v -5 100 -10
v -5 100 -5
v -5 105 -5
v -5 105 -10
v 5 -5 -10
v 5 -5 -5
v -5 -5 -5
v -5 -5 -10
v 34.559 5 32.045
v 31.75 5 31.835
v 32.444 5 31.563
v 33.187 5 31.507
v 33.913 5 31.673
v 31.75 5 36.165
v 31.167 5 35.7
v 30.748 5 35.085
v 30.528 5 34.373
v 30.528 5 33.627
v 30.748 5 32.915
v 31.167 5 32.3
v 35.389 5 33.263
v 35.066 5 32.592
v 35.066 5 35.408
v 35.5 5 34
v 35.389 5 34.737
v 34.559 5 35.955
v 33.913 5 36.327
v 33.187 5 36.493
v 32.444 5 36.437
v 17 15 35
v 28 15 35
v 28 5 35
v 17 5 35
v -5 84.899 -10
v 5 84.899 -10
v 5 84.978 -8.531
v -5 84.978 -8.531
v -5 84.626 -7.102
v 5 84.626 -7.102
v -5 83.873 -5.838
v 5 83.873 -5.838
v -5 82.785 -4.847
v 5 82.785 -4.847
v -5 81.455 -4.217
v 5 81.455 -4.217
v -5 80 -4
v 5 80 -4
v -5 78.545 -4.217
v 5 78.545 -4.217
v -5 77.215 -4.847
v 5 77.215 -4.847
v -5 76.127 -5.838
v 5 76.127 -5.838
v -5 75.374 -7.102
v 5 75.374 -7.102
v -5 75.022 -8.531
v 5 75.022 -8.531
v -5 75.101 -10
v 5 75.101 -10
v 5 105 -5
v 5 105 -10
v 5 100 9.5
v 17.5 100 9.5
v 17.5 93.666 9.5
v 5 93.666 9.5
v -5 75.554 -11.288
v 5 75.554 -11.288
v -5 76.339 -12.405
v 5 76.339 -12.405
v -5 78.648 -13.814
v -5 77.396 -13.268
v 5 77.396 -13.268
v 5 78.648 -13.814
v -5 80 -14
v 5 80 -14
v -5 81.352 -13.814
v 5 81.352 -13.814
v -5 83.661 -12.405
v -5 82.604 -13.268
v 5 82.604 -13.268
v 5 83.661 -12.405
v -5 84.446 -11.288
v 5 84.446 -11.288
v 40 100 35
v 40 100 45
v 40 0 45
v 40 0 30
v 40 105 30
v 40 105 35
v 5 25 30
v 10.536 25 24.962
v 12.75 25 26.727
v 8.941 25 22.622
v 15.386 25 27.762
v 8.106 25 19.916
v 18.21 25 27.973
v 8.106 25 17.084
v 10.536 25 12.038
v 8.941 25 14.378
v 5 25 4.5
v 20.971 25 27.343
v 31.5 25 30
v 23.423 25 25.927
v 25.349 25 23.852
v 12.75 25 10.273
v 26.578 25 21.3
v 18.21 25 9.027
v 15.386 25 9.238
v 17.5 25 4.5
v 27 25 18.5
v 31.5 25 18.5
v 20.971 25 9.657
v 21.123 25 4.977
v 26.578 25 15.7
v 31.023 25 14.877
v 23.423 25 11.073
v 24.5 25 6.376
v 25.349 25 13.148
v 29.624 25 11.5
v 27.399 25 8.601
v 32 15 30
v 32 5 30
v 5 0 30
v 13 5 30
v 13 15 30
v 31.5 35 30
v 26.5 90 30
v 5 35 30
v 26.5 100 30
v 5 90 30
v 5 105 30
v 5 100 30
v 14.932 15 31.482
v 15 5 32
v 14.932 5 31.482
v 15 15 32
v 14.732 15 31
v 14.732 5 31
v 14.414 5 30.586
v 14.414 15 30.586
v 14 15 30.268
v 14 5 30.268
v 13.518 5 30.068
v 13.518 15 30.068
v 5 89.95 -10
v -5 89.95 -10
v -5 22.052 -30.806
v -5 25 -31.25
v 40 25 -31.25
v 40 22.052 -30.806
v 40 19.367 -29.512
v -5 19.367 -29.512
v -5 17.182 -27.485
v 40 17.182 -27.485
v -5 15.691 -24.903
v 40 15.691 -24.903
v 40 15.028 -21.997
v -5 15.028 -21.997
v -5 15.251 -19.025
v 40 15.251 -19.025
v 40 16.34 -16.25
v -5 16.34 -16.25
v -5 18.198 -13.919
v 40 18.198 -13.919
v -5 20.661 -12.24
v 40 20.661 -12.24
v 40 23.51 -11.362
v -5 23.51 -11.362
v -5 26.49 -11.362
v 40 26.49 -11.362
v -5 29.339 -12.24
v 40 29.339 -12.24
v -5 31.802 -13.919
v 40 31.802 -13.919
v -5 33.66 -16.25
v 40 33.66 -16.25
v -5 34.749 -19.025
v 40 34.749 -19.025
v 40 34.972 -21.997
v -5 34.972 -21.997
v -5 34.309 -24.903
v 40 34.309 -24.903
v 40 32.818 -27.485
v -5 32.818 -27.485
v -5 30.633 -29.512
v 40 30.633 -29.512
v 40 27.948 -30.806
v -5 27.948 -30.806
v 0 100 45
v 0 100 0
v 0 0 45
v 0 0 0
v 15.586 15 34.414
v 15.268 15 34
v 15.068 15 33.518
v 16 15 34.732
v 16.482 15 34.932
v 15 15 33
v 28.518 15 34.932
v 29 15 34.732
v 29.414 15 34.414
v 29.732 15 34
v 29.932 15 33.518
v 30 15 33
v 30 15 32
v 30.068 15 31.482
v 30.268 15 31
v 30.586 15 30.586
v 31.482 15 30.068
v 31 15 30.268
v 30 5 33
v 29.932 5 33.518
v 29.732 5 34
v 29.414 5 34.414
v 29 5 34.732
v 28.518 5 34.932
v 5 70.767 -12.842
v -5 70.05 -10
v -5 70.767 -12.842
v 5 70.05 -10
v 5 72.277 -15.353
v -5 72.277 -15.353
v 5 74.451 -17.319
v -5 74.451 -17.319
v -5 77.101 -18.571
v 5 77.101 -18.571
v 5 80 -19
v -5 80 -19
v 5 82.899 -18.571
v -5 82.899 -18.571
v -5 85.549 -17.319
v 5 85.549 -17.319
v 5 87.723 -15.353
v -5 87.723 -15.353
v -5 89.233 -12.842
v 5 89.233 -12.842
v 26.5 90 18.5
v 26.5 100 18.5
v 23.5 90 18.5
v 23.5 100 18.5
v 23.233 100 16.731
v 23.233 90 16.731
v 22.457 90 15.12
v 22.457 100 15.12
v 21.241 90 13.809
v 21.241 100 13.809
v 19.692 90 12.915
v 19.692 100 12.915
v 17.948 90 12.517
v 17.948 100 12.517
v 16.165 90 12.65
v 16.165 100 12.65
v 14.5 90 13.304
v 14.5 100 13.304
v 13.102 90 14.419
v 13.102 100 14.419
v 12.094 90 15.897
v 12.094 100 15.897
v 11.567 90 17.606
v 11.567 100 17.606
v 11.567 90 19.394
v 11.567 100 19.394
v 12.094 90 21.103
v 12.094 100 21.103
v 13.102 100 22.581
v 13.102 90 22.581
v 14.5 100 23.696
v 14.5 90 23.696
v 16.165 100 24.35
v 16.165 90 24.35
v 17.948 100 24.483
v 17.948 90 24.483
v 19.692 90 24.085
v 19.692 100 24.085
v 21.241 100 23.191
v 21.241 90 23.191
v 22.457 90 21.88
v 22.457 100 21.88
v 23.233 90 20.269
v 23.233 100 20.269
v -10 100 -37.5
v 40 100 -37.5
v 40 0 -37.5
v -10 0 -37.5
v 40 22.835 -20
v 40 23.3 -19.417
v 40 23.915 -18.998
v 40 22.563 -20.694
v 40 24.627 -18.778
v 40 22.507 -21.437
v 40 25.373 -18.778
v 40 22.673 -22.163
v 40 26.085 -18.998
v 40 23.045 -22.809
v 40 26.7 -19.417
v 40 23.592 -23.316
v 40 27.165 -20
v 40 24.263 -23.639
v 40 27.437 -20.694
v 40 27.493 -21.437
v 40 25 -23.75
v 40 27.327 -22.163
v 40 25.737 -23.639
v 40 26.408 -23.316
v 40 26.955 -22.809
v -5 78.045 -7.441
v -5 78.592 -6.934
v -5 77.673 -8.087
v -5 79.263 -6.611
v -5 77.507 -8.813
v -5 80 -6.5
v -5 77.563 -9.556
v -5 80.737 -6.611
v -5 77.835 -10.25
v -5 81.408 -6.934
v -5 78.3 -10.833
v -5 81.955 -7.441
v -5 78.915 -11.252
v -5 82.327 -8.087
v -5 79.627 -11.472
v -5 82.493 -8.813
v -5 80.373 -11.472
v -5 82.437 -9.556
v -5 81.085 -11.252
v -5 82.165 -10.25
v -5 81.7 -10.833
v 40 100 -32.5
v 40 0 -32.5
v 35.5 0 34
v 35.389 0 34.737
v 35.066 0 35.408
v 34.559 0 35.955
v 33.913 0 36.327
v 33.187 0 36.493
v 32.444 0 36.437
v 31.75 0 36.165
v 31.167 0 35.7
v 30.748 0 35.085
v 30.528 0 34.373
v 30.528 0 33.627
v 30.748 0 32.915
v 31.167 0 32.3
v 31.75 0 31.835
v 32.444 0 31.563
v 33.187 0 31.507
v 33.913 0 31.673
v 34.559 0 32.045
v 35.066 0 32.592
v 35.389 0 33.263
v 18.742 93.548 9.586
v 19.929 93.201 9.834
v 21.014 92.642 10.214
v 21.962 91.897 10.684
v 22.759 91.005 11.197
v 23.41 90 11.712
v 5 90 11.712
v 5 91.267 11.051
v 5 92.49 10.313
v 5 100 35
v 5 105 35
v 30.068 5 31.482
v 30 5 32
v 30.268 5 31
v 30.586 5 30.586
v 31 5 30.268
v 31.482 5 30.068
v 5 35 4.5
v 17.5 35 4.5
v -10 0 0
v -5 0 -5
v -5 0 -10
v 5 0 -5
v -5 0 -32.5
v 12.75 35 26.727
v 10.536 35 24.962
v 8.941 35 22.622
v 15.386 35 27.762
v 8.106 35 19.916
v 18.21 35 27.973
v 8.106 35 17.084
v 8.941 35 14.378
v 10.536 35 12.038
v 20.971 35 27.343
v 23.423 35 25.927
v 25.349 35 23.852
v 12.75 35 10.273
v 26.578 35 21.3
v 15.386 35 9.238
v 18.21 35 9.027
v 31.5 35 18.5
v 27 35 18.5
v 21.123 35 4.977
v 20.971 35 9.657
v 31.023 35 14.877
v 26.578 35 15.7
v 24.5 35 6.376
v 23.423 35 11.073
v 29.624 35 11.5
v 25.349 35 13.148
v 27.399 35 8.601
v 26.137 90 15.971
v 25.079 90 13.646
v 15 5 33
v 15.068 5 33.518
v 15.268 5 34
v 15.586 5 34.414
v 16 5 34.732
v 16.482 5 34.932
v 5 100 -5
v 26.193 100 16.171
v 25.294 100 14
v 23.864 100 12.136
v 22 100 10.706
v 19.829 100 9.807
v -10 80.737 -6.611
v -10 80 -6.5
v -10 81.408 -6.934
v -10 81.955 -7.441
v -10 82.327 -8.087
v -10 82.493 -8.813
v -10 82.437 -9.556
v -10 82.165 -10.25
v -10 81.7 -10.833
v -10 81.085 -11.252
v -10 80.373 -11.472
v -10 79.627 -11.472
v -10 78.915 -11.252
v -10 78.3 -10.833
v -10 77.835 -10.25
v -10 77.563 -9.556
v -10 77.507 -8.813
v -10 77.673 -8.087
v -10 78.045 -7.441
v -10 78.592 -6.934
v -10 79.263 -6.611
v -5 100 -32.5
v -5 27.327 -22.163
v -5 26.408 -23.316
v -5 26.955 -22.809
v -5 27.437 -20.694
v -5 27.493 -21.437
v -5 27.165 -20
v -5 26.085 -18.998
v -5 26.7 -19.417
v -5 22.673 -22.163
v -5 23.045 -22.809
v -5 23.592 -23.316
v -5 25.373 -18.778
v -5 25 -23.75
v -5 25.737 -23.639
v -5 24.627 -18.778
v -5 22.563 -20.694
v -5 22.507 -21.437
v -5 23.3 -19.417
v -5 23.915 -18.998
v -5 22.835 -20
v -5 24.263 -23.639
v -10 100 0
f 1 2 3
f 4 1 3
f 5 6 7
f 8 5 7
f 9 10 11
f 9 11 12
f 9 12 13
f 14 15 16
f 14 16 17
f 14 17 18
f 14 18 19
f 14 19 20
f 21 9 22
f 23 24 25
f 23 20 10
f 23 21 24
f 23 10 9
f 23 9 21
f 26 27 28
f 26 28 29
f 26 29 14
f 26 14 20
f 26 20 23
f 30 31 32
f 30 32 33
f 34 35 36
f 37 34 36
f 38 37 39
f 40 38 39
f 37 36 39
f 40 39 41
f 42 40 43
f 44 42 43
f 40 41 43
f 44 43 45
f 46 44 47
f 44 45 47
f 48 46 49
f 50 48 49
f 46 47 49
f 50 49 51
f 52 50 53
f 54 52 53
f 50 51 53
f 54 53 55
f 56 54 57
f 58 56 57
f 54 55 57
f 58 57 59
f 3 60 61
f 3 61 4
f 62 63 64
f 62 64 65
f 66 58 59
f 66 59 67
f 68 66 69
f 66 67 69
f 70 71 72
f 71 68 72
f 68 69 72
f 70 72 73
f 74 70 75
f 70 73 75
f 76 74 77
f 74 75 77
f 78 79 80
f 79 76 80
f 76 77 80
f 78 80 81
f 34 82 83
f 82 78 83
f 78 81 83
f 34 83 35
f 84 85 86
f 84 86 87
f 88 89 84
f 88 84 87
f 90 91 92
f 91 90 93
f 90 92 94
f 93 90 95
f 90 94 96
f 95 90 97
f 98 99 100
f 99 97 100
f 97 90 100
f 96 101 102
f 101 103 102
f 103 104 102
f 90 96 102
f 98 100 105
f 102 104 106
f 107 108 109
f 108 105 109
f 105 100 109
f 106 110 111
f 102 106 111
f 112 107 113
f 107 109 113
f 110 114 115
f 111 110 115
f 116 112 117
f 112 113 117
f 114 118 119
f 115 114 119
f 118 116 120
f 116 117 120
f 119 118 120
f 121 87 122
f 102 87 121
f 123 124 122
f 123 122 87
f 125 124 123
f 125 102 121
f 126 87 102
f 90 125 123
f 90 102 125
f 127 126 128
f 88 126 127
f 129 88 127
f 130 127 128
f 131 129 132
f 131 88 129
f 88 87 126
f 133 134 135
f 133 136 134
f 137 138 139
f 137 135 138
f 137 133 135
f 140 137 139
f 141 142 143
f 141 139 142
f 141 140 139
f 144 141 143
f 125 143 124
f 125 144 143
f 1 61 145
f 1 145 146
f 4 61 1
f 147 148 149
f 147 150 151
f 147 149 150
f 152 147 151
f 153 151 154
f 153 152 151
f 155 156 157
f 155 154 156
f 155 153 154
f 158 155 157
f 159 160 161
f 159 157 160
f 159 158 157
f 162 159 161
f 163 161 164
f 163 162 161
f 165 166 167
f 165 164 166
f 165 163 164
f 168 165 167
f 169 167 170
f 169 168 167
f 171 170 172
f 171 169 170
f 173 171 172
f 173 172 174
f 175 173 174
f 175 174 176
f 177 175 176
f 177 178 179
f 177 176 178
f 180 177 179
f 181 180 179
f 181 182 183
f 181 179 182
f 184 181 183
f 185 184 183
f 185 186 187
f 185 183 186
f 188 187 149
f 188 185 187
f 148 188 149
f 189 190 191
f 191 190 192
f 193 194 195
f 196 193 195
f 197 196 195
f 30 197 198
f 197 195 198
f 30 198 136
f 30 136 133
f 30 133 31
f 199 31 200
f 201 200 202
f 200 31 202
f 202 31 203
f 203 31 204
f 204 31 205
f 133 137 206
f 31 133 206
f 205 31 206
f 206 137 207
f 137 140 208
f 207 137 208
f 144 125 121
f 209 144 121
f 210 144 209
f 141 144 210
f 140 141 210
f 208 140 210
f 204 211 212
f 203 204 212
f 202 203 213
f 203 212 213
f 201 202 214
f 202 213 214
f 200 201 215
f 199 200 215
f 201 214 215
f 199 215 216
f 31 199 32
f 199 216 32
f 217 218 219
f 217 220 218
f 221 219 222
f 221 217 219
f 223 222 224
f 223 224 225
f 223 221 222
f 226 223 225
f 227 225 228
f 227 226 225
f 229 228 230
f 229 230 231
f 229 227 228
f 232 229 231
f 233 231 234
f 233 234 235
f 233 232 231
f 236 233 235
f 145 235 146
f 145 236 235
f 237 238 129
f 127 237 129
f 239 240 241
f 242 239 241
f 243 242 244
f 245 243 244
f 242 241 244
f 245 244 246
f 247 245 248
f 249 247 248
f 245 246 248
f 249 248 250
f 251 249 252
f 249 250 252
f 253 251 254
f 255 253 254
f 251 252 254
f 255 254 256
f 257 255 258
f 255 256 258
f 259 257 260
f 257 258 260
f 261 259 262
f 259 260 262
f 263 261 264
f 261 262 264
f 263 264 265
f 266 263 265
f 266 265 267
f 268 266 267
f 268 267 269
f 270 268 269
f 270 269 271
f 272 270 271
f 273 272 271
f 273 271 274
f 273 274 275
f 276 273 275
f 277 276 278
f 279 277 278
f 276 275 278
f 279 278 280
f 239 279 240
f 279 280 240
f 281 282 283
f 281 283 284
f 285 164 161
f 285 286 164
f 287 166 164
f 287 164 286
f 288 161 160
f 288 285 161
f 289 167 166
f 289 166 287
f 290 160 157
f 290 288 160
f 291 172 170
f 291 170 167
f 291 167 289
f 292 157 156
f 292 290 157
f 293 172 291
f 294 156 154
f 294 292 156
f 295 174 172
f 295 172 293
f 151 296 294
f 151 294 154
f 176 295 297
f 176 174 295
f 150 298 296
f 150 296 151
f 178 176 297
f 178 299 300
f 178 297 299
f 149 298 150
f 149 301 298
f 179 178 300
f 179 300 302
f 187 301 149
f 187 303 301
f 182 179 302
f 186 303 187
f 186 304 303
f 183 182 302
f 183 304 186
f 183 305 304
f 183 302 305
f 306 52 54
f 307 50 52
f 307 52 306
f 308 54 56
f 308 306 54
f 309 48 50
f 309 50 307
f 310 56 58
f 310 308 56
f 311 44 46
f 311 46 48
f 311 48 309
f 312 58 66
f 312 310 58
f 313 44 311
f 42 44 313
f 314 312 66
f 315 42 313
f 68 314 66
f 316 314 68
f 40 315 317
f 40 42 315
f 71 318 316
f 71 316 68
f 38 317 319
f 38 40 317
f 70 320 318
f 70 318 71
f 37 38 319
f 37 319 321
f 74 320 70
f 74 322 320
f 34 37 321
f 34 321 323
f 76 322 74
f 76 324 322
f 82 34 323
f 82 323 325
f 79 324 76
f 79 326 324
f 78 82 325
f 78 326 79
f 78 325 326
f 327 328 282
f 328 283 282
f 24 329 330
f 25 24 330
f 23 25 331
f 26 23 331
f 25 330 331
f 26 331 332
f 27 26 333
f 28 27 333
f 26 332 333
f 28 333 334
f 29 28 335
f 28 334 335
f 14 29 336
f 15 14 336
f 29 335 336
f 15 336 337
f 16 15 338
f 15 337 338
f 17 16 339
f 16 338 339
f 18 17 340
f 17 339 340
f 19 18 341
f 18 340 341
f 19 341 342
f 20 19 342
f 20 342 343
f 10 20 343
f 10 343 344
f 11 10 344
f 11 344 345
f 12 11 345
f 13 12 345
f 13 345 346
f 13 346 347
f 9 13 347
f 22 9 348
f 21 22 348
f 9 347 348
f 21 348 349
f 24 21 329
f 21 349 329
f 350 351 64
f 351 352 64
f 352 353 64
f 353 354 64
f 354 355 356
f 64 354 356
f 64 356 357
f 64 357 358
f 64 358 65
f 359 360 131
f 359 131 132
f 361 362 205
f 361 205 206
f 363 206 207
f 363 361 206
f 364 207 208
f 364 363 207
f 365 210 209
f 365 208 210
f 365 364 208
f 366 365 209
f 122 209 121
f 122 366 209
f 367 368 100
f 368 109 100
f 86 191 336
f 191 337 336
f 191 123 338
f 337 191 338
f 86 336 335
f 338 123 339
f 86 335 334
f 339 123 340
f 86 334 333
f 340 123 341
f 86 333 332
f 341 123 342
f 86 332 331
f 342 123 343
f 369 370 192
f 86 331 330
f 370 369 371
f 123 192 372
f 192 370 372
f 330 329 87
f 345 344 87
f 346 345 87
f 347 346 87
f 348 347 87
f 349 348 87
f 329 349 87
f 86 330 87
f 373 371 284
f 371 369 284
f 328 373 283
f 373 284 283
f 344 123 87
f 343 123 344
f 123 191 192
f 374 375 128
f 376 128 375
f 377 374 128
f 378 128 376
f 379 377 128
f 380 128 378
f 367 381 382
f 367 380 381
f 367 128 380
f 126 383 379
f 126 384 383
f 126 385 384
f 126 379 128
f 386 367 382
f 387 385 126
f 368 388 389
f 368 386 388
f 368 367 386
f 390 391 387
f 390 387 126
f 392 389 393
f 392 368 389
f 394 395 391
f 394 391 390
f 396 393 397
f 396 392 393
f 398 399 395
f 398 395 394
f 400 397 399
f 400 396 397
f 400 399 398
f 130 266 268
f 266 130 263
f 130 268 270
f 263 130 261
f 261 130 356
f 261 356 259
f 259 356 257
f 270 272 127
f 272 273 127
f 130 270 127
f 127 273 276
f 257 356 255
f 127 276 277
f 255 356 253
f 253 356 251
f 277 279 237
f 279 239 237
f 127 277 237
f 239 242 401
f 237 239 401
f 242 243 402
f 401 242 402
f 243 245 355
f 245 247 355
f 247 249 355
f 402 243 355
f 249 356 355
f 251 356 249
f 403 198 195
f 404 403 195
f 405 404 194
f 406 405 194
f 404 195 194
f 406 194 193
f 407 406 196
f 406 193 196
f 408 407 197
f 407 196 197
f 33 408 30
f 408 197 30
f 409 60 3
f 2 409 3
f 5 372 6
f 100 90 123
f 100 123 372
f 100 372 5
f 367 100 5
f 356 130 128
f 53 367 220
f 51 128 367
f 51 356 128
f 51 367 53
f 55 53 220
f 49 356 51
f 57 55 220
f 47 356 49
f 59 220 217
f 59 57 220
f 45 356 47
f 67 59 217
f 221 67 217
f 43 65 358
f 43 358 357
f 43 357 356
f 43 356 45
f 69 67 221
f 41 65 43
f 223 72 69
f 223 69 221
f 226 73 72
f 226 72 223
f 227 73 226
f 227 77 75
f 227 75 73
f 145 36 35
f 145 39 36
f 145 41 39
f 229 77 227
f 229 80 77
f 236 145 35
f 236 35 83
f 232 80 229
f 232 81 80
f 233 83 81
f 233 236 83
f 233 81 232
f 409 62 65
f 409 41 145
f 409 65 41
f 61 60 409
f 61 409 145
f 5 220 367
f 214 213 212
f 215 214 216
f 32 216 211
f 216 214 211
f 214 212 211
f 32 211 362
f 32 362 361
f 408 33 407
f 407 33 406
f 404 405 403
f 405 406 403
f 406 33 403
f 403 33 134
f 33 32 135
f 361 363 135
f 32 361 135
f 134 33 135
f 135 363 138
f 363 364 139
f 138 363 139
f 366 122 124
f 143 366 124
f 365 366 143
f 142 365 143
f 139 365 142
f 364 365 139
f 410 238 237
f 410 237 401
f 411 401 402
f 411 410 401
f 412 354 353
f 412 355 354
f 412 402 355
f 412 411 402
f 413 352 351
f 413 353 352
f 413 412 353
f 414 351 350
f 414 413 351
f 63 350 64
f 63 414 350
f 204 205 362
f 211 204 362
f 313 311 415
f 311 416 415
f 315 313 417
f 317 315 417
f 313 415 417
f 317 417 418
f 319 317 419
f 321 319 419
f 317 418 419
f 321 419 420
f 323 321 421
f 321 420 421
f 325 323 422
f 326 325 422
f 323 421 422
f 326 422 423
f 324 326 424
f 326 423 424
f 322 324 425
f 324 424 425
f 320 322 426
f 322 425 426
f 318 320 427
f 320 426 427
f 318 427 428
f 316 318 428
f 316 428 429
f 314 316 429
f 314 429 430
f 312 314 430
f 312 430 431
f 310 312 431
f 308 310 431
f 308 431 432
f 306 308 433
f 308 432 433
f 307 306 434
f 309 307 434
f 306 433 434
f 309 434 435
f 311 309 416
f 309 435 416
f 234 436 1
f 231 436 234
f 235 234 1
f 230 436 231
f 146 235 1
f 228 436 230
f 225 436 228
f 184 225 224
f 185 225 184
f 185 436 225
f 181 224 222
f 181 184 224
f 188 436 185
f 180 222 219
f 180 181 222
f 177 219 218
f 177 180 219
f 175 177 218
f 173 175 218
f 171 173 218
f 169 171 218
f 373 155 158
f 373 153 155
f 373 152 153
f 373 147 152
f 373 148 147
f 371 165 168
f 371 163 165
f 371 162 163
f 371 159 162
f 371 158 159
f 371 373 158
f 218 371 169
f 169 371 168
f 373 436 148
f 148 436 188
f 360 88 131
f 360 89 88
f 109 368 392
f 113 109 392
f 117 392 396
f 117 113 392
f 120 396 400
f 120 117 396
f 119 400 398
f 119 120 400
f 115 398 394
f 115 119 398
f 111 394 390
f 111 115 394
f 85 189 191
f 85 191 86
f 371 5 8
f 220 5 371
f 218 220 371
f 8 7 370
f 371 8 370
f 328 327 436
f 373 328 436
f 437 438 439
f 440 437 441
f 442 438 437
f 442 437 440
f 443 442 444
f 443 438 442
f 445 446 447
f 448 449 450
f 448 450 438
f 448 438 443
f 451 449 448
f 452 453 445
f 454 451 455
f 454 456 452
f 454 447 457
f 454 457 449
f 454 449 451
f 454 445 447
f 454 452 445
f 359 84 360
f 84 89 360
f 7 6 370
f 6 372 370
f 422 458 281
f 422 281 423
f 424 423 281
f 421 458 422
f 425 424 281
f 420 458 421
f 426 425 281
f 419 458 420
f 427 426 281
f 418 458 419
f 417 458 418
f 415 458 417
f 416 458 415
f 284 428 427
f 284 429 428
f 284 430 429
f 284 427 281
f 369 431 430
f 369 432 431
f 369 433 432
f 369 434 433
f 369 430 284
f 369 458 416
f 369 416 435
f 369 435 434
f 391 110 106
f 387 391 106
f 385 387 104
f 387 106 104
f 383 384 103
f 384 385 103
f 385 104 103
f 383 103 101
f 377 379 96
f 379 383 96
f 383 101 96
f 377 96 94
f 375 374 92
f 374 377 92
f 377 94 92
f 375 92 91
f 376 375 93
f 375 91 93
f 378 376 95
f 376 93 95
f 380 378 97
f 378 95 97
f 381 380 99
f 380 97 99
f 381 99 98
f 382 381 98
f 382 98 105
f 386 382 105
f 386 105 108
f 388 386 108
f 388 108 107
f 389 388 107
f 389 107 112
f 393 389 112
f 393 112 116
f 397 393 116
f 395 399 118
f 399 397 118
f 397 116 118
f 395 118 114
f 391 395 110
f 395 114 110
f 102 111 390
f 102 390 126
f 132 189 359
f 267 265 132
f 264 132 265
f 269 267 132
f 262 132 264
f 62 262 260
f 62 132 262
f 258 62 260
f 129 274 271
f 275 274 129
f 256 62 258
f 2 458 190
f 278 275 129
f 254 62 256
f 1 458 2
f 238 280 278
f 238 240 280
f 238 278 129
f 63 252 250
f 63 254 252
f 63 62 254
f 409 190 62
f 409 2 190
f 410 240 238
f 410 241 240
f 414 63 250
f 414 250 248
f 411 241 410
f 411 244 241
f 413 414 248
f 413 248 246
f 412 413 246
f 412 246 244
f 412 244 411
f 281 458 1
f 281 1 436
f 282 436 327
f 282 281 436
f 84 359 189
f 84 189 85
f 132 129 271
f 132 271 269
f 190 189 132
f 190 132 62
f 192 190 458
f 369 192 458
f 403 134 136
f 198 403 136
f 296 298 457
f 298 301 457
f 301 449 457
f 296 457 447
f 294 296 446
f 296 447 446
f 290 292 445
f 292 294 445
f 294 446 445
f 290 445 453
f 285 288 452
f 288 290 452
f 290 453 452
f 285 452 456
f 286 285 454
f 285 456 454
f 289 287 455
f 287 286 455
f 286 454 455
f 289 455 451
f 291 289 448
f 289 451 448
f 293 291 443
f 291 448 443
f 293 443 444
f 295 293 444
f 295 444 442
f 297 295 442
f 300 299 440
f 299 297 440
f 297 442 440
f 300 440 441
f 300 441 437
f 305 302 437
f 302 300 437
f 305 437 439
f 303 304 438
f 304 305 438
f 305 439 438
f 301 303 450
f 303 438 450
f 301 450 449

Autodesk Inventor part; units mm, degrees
ref_plane "YZ Plane" through (0, 0, 0) normal (1, 0, 0) x (0, 1, 0)
ref_plane "XZ Plane" through (0, 0, 0) normal (0, 1, 0) x (-1, 0, 0)
sketch "Sketch1" plane through (0, 0, 0) normal (0, 0, 1) x (1, 0, 0)
  line L0 (0, 0) -> (40, 0)
  line L1 (40, 0) -> (40, 100)
  line L2 (40, 100) -> (0, 100)
  line L3 (0, 100) -> (0, 0)
  dimension "d0" = 40
  dimension "d1" = 100
extrude "Extrusion1" add sketch "Sketch1" along normal blind 45
sketch "Sketch2" plane through (0, 0, 0) normal (0, 0, -1) x (-1, 0, 0)
  line L0 (-40, 0) -> (-40, 100) projected
  line L1 (-40, 100) -> (10, 100)
  line L2 (10, 100) -> (10, 0)
  line L3 (10, 0) -> (-40, 0)
  line L4 (-40, 0) -> (-40, 100)
  point P0 (0, 0)
  dimension "d4" = 10
extrude "Extrusion2" add sketch "Sketch2" along normal blind 37.5
sketch "Sketch3" plane through (40, 0, 45) normal (1, 0, 0) x (0, 0, -1)
  line L0 (82.5, 100) -> (0, 100) projected
  line L1 (0, 0) -> (0, 100) projected
  line L2 (82.5, 0) -> (0, 0) projected
  line L3 (82.5, 100) -> (82.5, 0) projected
  line L4 (5, 5) -> (5, 95)
  line L5 (5, 95) -> (77.5, 95)
  line L6 (77.5, 95) -> (77.5, 5)
  line L7 (77.5, 5) -> (5, 5)
  point P0 (45, 0)
  dimension "d7" = 5
extrude "Extrusion3" cut sketch "Sketch3" against normal blind 35 contours L4 L5 L6 L7
sketch "Sketch4" plane through (5, 0, 45) normal (1, 0, 0) x (0, 0, -1)
  line L0 (45, 100) -> (45, 0) projected
  line L1 (45, 100) -> (82.5, 100) projected
  line L2 (82.5, 0) -> (82.5, 100) projected
  line L3 (45, 0) -> (82.5, 0) projected
  line L4 (50, 5) -> (50, 95)
  line L5 (50, 95) -> (77.5, 95)
  line L6 (77.5, 95) -> (77.5, 5)
  line L7 (77.5, 5) -> (50, 5)
  point P0 (45, 0)
  dimension "d10" = 5
extrude "Extrusion4" cut sketch "Sketch4" against normal blind 10 contours L4 L5 L6 L7
sketch "Sketch5" plane through (0, 0, 45) normal (0, -1, 0) x (1, 0, 0)
  line L0 (0, 0) -> (40, 0) projected
  line L1 (0, -45) -> (0, 0) projected
  line L2 (-10, -45) -> (0, -45) projected
  line L3 (-10, -45) -> (-10, -82.5) projected
  line L4 (40, -82.5) -> (-10, -82.5) projected
  line L5 (40, -77.5) -> (-5, -77.5)
  line L6 (-5, -77.5) -> (-5, -50)
  line L7 (-5, -50) -> (5, -50)
  line L8 (5, -50) -> (5, -5)
  line L9 (5, -5) -> (40, -5)
  line L10 (40, -77.5) -> (40, -5)
  line L11 (40, -82.5) -> (40, 0) projected
  dimension "d13" = 5
extrude "Extrusion5" cut sketch "Sketch5" against normal through all contours L10 L5 L6 L7 L8 L9
sketch "Sketch6" plane through (0, 100, 45) normal (0, 1, 0) x (1, 0, 0)
  line L0 (0, 45) -> (0, 0) projected
  line L1 (0, 0) -> (40, 0)
  line L2 (40, 0) -> (40, 10)
  line L3 (40, 10) -> (0, 10)
  line L4 (0, 10) -> (0, 0)
  dimension "d16" = 40
  dimension "d17" = 10
extrude "Extrusion6" add sketch "Sketch6" against normal blind 100
sketch "Sketch8" plane through (40, 100, 35) normal (0, 0, -1) x (-1, 0, 0)
  line L0 (35, 0) -> (35, -100) projected
  line L1 (0, 0) -> (35, 0) projected
  line L2 (0, 0) -> (0, -100) projected
  line L3 (35, -100) -> (0, -100) projected
  line L4 (35, -105) -> (0, -105)
  line L5 (0, -105) -> (0, 5)
  line L6 (0, 5) -> (35, 5)
  line L7 (35, 5) -> (35, -105)
  point P0 (40, -100)
  dimension "d20" = 5
  dimension "d21" = 5
extrude "Extrusion7" add sketch "Sketch8" along normal blind 5
sketch "Sketch10" plane through (5, 0, -5) normal (0, 0, -1) x (-1, 0, 0)
  line L0 (0, 0) -> (0, 100) projected
  line L1 (10, 0) -> (0, 0) projected
  line L2 (10, 0) -> (10, 100) projected
  line L3 (0, 100) -> (10, 100) projected
  line L4 (-35, -5) -> (0, -5) projected
  line L5 (10, 0) -> (0, 0)
  line L6 (0, 0) -> (0, -5)
  line L7 (0, -5) -> (10, -5)
  line L8 (10, -5) -> (10, 0)
  line L9 (0, 105) -> (0, 100) projected
  line L10 (10, 100) -> (0, 100)
  line L11 (0, 100) -> (0, 105)
  line L12 (0, 105) -> (10, 105)
  line L13 (10, 105) -> (10, 100)
  point P0 (5, 0)
extrude "Extrusion8" add sketch "Sketch10" along normal blind 5
sketch "Sketch25" plane through (5, 0, 45) normal (1, 0, 0) x (0, 0, -1)
  circle A0 centre (32.5, 25) radius 10
  circle A1 centre (32.5, 25) radius 2.5
  line L0 (50, 0) -> (15, 0) projected
  line L1 (15, 105) -> (15, -5) projected
  circle A2 centre (66.25, 25) radius 2.5
  circle A3 centre (66.25, 25) radius 10
  line L2 (77.5, 0) -> (55, 0) projected
  point P0 (32.5, 0)
  point P1 (15, 55)
  point P2 (15, 25)
  point P3 (66.25, 0)
  dimension "d89" = 20
  dimension "d90" = 5
  dimension "d93" = 5
  dimension "d94" = 20
extrude "Extrusion22" add sketch "Sketch25" along normal blind 35 contours A3
sketch "Sketch26" plane through (-5, 0, 45) normal (1, 0, 0) x (0, 0, -1)
  circle A0 centre (66.25, 25) radius 10 projected
  circle A1 centre (66.25, 25) radius 2.5 projected
  point P0 (45, 0)
extrude "Extrusion23" add sketch "Sketch26" along normal blind 10
sketch "Sketch27" plane through (5, 0, 45) normal (1, 0, 0) x (0, 0, -1)
  circle A0 centre (54, 80) radius 10
  circle A1 centre (54, 80) radius 5
  line L0 (15, 105) -> (15, -5) projected
  line L1 (15, 100) -> (50, 100) projected
  point P0 (45, 0)
  dimension "d98" = 20
  dimension "d99" = 10
  dimension "d100" = 39
  dimension "d101" = 20
extrude "Extrusion24" add sketch "Sketch27" against normal blind 10
sketch "Sketch30" plane through (40, 0, 45) normal (1, 0, 0) x (0, 0, -1)
  line L0 (10, 0) -> (0, 0) projected
  line L1 (15, -5) -> (15, 0) projected
  line L2 (10, 0) -> (15, 0)
  line L3 (15, 0) -> (15, -5)
  line L4 (15, -5) -> (10, -5)
  line L5 (10, -5) -> (10, 0)
  point P0 (45, 0)
extrude "Extrusion27" cut sketch "Sketch30" against normal through all
sketch "Sketch31" plane through (40, 100, 30) normal (0, 0, -1) x (-1, 0, 0)
  line L0 (40, -100) -> (0, -100) projected
  line L1 (0, -100) -> (0, 0) projected
  line L2 (0, 0) -> (40, 0) projected
  line L3 (40, 0) -> (40, -100) projected
  line L4 (10, -95) -> (25, -95)
  line L5 (25, -95) -> (25, -85)
  line L6 (25, -85) -> (10, -85)
  line L7 (10, -85) -> (10, -95)
  line L8 (35, 0) -> (35, -100) projected
  dimension "d110" = 15
  dimension "d111" = 10
  dimension "d112" = 10
  dimension "d113" = 5
extrude "Extrusion28" cut sketch "Sketch31" against normal blind 5 contours L7 L6 L5 L4
fillet "Fillet1" radius 2 4 edges at (15, 10, 30) (30, 10, 30) (15, 10, 35) (30, 10, 35)
sketch "Sketch32" plane through (0, 0, 45) normal (0, -1, 0) x (1, 0, 0)
  line L0 (2, -11) -> (33, -11) construction
  line L1 (33, -11) -> (33, -42) construction
  line L2 (33, -42) -> (2, -42) construction
  line L3 (2, -42) -> (2, -11) construction
  line L4 (40, -82.5) -> (-10, -82.5) construction
  line L5 (40, 0) -> (40, -15) construction
  circle A0 centre (33, -11) radius 2.5
  point P0 (0, -45)
  dimension "d117" = 31
  dimension "d118" = 31
  dimension "d119" = 40.5
  dimension "d120" = 7
  dimension "d121" = 5
extrude "Extrusion29" cut sketch "Sketch32" against normal blind 5
sketch "Sketch33" plane through (0, 100, 45) normal (0, 1, 0) x (1, 0, 0)
  circle A0 centre (17.5, 26.5) radius 6
  circle A1 centre (17.5, 26.5) radius 9 construction
  line L0 (26.5, 26.5) -> (26.5, 15)
  line L1 (8.5, 15) -> (26.5, 15)
  line L2 (17.5, 35.5) -> (5, 35.5)
  line L3 (5, 15) -> (5, 50) projected
  line L4 (5, 35.5) -> (5, 15)
  line L5 (40, 15) -> (5, 15) projected
  line L6 (5, 15) -> (40, 15) projected
  line L7 (8.5, 15) -> (5, 15)
  arc A2 (26.5, 26.5) -> (17.5, 35.5) centre (17.5, 26.5) ccw
  point P0 (0, 45)
  dimension "d125" = 12
  dimension "d127" = 18
  dimension "d130" = 12.5
  dimension "d131" = 11.5
extrude "Extrusion32" add sketch "Sketch33" against normal blind 10
sketch "Sketch35" plane through (5, 0, 45) normal (1, 0, 0) x (0, 0, -1)
  circle A0 centre (54, 80) radius 10 projected
  circle A1 centre (54, 80) radius 23
  point P0 (45, 0)
  dimension "d136" = 46
extrude "Extrusion33" cut sketch "Sketch35" along normal through all
ref_plane "Work Plane2" through (0, 25, 45) normal (0, 1, 0) x (1, 0, 0)
sketch "Sketch36" plane through (0, 25, 45) normal (0, 1, 0) x (1, 0, 0)
  line L0 (5, 50) -> (5, 15) projected
  line L1 (5, 15) -> (40, 15) projected
  circle A0 centre (17.5, 26.5) radius 6 construction
  circle A1 centre (17.5, 26.5) radius 9.5
  circle A2 centre (17.5, 26.5) radius 14 construction
  line L2 (31.5, 26.5) -> (31.5, 15)
  line L3 (31.5, 15) -> (5, 15)
  line L4 (5, 40.5) -> (5, 15)
  line L5 (17.5, 40.5) -> (5, 40.5)
  arc A3 (31.5, 26.5) -> (17.5, 40.5) centre (17.5, 26.5) ccw
  point P0 (0, 45)
  dimension "d140" = 19
  dimension "d141" = 28
extrude "Extrusion34" add sketch "Sketch36" along normal blind 10
sketch "Sketch37" plane through (5, 0, 45) normal (1, 0, 0) x (0, 0, -1)
  arc A0 (55, 75.101) -> (55, 84.899) centre (54, 80) ccw projected
  circle A1 centre (54, 80) radius 5
  point P0 (45, 0)
extrude "Extrusion35" cut sketch "Sketch37" against normal blind 10
sketch "Sketch38" plane through (0, 0, 45) normal (-1, 0, 0) x (0, 0, 1)
  arc A0 (-45, 75.6411) -> (-45, 84.3589) centre (-54, 80) ccw projected
  line L0 (-45, 75.6411) -> (-45, 0) projected
  line L1 (-45, 0) -> (0, 0) projected
  line L2 (0, 100) -> (0, 0) projected
  line L3 (-45, 100) -> (0, 100) projected
  line L4 (-45, 100) -> (-45, 84.3589) projected
  line L5 (-45, 0) -> (0, 0)
  line L6 (0, 0) -> (0, 100)
  line L7 (0, 100) -> (-45, 100)
  line L8 (-45, 100) -> (-45, 0)
extrude "Extrusion36" cut sketch "Sketch38" along normal through all
sketch "Sketch39" plane through (-10, 0, 0) normal (-1, 0, 0) x (0, 0, 1)
  circle A0 centre (-9, 80) radius 5 projected
  circle A1 centre (-9, 80) radius 2.5
  point P0 (0, 0)
  dimension "d148" = 5
extrude "Extrusion37" cut sketch "Sketch39" against normal through all contours A1
properties part number "BA003" material "ABS Plastic"
